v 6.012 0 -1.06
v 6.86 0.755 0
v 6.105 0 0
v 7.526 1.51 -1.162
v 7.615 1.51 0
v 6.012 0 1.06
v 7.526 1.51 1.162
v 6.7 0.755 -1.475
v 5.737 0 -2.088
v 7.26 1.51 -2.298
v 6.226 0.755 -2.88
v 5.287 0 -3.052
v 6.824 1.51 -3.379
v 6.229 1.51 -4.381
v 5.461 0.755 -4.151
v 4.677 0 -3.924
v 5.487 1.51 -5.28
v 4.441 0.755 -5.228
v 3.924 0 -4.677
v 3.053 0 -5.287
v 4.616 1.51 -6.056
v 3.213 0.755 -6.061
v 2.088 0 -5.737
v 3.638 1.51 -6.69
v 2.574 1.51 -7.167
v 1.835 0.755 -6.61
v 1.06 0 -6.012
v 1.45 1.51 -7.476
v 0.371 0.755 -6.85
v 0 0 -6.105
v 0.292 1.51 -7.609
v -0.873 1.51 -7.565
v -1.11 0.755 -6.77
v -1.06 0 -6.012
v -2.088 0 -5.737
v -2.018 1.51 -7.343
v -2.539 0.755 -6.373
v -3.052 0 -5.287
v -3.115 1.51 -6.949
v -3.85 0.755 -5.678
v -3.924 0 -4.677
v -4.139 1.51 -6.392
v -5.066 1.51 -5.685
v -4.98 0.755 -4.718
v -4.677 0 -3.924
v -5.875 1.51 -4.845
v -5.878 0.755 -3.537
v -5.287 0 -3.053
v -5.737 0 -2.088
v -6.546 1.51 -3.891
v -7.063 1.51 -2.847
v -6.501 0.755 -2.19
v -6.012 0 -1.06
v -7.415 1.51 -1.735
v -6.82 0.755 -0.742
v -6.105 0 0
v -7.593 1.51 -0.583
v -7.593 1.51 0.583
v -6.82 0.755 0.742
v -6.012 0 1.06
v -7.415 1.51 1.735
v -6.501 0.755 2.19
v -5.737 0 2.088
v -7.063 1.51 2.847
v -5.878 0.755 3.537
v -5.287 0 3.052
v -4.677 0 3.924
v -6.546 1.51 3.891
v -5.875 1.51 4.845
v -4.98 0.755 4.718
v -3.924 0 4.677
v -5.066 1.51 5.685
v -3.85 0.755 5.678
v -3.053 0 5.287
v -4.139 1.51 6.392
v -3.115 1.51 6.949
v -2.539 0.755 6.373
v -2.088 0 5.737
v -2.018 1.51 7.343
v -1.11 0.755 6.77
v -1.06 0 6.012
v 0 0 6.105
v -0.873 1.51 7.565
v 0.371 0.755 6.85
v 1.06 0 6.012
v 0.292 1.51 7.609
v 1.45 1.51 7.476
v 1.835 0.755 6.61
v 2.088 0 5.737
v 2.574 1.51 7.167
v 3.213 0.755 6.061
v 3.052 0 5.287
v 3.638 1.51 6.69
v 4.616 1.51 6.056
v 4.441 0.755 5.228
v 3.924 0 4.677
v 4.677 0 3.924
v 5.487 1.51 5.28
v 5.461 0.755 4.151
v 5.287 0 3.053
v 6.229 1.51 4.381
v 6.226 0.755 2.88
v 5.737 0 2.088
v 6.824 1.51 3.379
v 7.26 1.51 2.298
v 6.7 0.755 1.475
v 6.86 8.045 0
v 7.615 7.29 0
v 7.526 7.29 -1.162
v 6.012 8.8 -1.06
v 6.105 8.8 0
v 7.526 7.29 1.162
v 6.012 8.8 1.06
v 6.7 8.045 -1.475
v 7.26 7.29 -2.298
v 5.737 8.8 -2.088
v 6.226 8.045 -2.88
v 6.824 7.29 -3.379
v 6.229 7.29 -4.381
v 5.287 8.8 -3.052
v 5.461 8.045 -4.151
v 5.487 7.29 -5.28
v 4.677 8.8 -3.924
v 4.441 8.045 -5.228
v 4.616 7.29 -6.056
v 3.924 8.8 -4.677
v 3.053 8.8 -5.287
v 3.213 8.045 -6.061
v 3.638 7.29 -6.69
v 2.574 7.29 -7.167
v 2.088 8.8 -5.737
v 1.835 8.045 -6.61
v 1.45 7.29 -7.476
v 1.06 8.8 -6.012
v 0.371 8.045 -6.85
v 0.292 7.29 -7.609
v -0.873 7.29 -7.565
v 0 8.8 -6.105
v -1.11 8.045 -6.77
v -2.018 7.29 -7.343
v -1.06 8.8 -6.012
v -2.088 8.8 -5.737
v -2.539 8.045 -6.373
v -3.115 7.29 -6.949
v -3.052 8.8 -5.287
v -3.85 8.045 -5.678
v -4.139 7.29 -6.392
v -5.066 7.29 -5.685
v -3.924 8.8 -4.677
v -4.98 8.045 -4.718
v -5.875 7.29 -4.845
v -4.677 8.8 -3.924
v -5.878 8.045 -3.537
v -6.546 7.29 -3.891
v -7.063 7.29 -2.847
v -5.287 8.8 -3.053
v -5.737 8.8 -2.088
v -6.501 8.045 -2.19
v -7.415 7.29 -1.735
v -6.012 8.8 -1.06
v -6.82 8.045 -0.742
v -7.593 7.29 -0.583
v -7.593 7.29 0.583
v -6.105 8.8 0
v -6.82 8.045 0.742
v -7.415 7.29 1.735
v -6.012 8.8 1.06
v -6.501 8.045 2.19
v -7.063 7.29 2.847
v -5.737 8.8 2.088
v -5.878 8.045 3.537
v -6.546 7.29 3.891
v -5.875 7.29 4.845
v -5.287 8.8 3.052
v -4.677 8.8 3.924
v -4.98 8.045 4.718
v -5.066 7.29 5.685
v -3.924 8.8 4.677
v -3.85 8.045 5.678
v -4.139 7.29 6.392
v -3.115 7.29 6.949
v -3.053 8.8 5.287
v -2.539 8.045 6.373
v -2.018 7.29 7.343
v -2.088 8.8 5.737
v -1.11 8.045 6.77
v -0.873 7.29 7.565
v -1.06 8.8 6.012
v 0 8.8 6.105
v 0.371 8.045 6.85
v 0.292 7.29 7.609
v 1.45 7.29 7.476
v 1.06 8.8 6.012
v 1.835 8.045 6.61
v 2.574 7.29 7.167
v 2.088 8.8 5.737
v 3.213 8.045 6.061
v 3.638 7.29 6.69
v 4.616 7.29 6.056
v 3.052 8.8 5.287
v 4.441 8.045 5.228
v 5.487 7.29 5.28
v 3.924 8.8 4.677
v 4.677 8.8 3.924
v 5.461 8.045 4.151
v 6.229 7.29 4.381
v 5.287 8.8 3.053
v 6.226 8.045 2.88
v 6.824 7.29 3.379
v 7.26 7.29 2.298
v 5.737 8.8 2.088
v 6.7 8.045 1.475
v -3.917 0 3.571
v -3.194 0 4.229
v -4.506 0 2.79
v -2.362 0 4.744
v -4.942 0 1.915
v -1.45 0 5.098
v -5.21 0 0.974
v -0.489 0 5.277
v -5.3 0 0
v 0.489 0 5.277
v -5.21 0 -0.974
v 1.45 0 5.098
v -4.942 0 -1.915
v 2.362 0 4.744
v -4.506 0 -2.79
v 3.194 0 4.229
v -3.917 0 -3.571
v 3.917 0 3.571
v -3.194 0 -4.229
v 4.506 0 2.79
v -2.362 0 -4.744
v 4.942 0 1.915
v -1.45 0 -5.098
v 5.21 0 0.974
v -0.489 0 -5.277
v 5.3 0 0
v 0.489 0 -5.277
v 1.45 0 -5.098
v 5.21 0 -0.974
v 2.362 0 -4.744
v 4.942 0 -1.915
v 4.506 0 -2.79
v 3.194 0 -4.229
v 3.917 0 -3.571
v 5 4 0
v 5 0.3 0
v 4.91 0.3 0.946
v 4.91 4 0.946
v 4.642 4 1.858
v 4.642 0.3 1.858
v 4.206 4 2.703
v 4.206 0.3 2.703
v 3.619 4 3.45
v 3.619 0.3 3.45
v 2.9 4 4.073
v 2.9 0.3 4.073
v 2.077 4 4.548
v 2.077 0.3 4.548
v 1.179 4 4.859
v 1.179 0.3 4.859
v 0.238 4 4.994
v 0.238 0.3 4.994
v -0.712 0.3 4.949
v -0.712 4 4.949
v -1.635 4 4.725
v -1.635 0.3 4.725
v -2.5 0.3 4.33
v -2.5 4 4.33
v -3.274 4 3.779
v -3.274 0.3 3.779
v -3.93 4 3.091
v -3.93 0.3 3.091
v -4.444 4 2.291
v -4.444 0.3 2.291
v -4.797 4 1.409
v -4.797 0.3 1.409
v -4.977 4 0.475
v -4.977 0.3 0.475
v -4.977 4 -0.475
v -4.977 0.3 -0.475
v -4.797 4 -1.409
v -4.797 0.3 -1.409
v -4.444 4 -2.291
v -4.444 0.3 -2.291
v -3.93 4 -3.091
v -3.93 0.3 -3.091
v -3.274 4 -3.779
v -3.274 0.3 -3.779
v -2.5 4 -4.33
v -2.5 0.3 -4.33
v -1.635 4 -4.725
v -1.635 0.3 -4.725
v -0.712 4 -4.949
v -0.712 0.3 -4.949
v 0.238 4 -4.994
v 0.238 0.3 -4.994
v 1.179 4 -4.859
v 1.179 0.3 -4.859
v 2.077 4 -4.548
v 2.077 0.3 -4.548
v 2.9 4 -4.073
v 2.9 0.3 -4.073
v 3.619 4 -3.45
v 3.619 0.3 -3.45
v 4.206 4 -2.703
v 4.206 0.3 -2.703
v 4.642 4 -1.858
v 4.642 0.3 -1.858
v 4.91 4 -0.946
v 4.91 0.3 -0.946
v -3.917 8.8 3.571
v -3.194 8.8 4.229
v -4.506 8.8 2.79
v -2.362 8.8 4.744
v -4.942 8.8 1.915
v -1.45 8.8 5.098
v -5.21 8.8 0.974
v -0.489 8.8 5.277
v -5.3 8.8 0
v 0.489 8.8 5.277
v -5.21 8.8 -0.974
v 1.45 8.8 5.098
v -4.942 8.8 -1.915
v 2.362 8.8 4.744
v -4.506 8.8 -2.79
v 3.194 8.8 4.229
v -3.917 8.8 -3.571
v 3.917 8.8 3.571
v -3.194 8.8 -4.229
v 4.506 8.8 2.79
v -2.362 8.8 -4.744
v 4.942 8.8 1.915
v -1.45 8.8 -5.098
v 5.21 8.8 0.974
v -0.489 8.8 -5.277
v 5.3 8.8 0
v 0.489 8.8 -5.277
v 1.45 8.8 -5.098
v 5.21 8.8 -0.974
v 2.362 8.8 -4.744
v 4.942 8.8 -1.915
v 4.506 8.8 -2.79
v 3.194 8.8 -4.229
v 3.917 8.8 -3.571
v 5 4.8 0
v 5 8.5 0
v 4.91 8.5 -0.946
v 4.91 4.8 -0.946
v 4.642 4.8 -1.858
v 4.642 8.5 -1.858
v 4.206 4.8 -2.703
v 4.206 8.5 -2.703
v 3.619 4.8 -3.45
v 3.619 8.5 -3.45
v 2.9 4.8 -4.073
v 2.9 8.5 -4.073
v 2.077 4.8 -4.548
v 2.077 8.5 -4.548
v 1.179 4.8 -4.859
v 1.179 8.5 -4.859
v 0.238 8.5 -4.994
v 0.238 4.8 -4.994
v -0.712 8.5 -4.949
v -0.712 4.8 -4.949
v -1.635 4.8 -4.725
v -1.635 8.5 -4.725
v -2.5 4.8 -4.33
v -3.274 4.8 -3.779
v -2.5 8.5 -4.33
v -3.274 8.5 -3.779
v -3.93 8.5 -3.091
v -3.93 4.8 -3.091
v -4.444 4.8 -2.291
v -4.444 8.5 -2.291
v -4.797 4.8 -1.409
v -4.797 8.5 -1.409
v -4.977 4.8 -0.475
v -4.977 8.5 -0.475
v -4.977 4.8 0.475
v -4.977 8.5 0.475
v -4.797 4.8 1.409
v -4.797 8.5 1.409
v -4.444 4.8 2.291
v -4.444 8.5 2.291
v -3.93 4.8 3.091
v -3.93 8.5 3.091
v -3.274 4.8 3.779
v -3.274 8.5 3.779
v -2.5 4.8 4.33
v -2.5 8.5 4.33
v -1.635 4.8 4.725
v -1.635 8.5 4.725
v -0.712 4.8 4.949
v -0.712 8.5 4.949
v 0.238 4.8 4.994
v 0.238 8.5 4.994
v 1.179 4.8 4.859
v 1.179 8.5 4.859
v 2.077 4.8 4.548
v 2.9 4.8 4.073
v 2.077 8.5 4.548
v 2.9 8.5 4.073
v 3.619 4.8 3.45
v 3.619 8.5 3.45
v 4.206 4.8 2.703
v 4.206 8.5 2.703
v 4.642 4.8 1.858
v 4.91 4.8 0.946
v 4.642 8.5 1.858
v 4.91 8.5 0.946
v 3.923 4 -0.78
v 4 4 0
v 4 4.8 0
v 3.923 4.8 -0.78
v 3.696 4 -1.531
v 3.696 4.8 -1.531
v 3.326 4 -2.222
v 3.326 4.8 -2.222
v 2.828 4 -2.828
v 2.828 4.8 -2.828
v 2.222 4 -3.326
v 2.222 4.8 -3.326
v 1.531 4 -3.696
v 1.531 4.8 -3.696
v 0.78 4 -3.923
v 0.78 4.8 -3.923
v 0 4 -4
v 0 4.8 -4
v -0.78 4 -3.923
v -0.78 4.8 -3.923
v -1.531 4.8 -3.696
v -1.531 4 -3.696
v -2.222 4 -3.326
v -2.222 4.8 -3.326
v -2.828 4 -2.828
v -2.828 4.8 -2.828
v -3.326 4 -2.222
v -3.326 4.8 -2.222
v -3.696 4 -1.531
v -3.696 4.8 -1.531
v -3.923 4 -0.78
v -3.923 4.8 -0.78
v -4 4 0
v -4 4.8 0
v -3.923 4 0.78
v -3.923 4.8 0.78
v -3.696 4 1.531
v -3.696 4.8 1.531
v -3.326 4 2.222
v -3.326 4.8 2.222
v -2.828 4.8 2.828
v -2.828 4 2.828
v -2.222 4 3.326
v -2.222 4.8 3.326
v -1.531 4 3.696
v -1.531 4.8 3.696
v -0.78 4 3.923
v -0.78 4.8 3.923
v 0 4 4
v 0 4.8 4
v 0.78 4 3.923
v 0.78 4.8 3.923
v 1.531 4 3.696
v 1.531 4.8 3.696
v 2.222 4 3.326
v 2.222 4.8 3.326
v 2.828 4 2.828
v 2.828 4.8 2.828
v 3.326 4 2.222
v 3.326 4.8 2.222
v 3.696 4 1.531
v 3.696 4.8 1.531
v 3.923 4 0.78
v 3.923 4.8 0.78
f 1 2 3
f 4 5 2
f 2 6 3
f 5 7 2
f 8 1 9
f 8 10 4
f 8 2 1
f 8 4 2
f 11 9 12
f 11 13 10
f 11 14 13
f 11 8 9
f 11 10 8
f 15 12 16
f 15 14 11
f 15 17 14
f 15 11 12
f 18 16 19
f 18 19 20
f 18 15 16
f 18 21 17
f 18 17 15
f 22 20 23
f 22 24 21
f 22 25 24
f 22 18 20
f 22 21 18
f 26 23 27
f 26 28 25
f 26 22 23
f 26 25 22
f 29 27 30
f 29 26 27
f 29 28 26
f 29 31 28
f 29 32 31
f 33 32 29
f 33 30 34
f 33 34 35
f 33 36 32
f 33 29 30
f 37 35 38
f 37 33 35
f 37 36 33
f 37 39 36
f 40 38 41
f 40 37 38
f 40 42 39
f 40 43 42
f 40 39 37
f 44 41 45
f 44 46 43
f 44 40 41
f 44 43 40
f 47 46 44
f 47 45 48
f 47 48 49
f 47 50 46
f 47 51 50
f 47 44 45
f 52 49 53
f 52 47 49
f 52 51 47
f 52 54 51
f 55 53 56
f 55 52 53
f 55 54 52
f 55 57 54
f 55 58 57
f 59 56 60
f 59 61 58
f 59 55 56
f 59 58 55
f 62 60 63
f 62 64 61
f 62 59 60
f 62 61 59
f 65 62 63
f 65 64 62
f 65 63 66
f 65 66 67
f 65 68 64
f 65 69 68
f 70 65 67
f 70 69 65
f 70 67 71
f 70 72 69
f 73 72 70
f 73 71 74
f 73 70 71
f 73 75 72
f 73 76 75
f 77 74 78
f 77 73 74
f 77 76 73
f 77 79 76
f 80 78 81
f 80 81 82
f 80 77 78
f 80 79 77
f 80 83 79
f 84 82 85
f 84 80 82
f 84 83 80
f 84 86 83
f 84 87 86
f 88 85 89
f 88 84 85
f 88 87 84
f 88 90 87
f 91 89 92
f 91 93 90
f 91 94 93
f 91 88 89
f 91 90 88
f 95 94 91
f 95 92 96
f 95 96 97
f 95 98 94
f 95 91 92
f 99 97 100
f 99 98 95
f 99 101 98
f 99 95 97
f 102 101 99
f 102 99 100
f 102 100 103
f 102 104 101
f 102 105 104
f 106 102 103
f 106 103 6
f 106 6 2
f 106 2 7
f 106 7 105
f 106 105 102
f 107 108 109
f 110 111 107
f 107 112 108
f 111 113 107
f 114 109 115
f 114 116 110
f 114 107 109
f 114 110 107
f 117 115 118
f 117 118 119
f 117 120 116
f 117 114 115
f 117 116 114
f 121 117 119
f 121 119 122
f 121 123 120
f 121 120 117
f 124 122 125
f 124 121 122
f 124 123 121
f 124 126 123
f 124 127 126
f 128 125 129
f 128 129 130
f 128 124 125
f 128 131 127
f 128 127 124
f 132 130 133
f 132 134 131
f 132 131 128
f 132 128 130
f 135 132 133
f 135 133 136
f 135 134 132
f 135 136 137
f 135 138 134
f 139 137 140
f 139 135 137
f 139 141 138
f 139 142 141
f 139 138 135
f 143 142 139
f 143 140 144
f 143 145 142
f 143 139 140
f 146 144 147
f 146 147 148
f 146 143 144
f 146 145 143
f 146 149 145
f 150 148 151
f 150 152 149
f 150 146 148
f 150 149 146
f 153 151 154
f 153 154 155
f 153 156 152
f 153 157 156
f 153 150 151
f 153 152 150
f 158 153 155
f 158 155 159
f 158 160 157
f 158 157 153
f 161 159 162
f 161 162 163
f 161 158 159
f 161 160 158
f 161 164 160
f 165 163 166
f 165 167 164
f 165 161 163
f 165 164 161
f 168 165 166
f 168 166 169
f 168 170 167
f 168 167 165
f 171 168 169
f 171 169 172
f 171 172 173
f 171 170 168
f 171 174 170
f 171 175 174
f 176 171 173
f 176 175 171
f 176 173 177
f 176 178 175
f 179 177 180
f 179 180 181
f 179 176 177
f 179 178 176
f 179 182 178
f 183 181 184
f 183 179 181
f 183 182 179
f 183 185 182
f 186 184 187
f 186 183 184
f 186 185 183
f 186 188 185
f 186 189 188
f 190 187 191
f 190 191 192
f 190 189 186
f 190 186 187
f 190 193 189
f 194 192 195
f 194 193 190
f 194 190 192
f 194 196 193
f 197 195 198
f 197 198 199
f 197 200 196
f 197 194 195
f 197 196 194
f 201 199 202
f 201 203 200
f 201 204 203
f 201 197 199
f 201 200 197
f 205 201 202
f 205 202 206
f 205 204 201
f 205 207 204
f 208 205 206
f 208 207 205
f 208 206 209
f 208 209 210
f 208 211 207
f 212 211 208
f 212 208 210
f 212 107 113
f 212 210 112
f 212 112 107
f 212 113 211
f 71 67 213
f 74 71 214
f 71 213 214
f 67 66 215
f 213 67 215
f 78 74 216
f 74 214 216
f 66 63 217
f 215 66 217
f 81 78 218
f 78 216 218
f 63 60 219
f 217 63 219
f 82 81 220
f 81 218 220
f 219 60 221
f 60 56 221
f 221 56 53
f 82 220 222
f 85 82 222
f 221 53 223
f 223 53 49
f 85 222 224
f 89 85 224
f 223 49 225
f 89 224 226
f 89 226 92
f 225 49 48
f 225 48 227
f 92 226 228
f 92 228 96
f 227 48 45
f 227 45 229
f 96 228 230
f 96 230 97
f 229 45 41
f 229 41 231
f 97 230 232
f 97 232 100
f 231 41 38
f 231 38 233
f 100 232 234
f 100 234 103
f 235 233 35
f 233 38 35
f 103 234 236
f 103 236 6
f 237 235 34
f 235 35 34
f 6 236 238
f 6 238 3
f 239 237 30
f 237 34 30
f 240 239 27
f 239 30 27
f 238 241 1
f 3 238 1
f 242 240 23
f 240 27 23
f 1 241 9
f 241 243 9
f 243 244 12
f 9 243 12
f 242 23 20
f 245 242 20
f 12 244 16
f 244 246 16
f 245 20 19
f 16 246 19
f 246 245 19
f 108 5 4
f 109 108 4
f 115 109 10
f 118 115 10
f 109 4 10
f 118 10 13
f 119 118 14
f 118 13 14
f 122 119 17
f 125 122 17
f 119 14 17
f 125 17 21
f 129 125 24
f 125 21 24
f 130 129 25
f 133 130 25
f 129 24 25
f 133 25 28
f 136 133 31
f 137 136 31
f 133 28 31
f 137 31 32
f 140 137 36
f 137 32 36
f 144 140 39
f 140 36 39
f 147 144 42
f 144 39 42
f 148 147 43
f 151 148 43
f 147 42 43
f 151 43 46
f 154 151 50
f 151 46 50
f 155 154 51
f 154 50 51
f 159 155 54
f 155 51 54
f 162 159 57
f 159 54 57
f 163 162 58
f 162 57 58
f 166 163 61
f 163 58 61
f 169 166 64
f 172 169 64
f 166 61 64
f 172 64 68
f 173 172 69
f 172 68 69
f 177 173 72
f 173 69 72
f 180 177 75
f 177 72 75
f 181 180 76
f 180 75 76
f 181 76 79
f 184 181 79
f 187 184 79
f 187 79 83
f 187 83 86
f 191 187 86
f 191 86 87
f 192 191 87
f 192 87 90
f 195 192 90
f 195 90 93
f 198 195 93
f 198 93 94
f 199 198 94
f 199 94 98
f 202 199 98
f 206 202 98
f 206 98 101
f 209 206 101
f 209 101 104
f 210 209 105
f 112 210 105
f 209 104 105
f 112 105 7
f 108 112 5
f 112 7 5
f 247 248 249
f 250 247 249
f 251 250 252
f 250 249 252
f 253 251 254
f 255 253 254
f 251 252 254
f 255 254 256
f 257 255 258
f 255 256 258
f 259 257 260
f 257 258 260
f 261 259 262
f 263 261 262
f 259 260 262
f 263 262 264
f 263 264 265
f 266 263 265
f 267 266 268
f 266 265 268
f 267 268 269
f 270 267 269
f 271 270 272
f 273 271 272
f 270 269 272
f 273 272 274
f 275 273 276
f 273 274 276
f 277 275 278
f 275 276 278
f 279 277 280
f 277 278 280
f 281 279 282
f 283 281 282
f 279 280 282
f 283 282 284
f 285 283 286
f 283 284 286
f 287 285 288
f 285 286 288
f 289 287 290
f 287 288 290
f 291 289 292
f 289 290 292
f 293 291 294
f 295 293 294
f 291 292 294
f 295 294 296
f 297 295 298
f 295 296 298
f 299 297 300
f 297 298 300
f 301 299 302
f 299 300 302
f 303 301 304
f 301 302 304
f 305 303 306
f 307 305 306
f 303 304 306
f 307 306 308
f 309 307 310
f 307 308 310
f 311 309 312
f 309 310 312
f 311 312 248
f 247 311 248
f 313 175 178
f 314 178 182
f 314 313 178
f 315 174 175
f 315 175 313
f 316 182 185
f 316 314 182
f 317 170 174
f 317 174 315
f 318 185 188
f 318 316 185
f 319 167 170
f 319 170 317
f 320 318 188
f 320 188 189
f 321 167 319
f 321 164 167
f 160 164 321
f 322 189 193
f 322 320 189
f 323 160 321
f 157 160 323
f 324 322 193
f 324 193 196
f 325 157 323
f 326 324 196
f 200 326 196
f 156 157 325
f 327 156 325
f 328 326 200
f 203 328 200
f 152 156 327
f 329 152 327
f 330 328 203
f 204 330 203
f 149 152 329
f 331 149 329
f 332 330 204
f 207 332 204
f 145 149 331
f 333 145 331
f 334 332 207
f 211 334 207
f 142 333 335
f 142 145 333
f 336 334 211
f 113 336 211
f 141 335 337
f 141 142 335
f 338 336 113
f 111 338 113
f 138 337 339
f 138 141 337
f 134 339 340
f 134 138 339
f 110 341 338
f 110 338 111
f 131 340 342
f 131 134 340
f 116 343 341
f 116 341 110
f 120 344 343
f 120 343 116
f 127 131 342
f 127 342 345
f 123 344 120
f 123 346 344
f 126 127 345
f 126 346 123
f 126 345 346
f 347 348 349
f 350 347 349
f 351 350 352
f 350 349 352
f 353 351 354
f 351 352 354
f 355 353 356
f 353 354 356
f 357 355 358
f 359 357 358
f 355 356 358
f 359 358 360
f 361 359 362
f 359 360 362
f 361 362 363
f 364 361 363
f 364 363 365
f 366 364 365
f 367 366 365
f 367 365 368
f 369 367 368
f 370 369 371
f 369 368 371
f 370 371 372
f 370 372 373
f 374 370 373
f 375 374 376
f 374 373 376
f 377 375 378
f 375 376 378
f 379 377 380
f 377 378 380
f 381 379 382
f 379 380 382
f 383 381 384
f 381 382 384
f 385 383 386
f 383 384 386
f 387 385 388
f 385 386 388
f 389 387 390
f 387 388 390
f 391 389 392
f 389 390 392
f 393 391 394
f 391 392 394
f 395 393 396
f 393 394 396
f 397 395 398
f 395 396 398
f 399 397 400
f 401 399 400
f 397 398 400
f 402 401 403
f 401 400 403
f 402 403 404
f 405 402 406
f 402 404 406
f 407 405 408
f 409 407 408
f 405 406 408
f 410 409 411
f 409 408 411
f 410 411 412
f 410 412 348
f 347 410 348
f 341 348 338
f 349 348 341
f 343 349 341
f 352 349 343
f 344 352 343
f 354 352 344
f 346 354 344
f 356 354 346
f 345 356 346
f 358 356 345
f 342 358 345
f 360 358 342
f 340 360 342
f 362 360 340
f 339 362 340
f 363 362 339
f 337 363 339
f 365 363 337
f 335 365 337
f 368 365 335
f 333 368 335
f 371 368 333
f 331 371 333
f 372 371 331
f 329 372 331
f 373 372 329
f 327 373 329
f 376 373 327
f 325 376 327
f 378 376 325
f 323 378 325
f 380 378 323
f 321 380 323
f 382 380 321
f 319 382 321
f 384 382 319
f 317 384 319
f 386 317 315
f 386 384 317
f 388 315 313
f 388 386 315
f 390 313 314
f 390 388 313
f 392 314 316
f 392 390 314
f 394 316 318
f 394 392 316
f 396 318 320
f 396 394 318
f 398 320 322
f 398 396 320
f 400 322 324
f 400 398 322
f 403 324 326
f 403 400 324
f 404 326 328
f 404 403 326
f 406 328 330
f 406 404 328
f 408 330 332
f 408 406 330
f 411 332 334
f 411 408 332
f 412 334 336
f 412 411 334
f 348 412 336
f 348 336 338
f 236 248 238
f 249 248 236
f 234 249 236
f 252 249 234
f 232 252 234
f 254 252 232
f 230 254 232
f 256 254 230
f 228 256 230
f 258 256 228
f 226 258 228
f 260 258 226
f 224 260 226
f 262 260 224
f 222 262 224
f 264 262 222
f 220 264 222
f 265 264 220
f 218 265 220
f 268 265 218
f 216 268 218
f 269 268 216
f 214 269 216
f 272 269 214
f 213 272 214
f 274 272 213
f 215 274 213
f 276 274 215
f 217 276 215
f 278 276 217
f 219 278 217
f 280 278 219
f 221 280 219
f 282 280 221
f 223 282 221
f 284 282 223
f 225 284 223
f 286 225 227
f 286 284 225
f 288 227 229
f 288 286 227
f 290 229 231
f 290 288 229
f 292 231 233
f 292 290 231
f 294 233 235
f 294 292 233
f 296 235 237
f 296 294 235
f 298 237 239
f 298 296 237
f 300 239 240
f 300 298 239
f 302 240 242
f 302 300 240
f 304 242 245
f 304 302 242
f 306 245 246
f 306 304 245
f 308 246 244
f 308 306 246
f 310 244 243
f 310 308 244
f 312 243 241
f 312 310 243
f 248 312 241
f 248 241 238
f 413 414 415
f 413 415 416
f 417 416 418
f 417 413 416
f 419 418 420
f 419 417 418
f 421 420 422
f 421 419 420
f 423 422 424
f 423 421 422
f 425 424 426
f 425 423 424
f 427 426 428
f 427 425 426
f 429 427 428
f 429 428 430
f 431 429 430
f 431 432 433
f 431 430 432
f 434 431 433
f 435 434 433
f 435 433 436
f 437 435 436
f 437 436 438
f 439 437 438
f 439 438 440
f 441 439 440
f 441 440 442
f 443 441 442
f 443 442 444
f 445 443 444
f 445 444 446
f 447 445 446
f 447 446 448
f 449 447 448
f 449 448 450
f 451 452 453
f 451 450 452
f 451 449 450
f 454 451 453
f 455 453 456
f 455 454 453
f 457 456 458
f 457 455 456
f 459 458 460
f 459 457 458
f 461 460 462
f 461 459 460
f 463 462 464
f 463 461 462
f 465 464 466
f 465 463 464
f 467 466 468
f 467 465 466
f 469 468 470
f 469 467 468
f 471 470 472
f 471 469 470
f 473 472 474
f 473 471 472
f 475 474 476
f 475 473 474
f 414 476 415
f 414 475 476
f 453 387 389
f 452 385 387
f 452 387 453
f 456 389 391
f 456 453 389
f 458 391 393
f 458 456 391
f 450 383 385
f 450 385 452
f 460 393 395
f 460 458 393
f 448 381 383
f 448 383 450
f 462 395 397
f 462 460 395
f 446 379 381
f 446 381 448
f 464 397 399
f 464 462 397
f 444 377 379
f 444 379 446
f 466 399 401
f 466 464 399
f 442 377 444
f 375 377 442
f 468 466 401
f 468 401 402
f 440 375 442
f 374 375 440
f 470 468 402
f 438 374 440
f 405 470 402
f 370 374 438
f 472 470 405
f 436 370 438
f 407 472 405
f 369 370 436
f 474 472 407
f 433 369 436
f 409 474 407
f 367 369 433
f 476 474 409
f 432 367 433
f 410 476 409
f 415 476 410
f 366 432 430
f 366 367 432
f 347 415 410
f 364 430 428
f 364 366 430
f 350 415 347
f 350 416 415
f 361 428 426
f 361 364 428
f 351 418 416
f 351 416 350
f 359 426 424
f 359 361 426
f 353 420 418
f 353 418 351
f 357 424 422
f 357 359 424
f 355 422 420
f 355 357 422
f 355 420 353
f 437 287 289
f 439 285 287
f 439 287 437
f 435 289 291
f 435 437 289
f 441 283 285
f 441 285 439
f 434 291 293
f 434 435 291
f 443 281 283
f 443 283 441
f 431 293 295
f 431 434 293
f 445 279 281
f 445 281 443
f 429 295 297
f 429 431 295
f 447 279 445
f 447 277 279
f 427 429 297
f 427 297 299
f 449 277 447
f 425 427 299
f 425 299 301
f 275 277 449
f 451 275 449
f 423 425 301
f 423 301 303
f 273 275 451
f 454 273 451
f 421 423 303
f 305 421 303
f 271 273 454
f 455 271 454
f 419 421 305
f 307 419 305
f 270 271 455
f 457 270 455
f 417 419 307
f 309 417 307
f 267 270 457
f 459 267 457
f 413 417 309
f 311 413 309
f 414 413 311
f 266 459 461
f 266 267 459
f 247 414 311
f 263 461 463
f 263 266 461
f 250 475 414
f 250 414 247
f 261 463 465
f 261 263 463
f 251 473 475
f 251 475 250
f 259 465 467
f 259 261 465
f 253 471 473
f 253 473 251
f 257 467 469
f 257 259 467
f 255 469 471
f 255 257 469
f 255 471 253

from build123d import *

# Parameters (mm, degrees)
SKETCH1_R           = 7.615
SKETCH1_R_2         = 4
BOSS_EXTRUDE1_DEPTH = 8.8
SKETCH2_R           = 5
CUT_EXTRUDE1_DEPTH  = 4
SKETCH3_R           = 5
CUT_EXTRUDE2_DEPTH  = 4
CHAMFER1_SIZE       = 0.3
CHAMFER2_SIZE       = 1.51


with BuildPart() as part:
    # Sketch1 → Boss-Extrude1 (new body)
    with BuildSketch(Plane(origin=(0, 0, 0), x_dir=(1, 0, 0), z_dir=(0, 1, 0))):
        Circle(SKETCH1_R)
        Circle(SKETCH1_R_2, mode=Mode.SUBTRACT)
    extrude(amount=BOSS_EXTRUDE1_DEPTH)

    # Sketch2 → Cut-Extrude1 (cut)
    with BuildSketch(Plane(origin=(0, 8.8, 0), x_dir=(1, 0, 0), z_dir=(0, 1, 0))):
        Circle(SKETCH2_R)
    extrude(amount=-CUT_EXTRUDE1_DEPTH, mode=Mode.SUBTRACT)

    # Sketch3 → Cut-Extrude2 (cut)
    with BuildSketch(Plane.XZ):
        Circle(SKETCH3_R)
    extrude(amount=-CUT_EXTRUDE2_DEPTH, mode=Mode.SUBTRACT)

    # Chamfer1
    chamfer1_edges = [part.edges().sort_by_distance(p)[0] for p in [
        (-5, 8.8, 0),
        (-5, 0, 0),
    ]]
    chamfer(chamfer1_edges, length=CHAMFER1_SIZE)

    # Chamfer2
    chamfer2_edges = [part.edges().sort_by_distance(p)[0] for p in [
        (-7.615, 0, 0),
        (-7.615, 8.8, 0),
    ]]
    chamfer(chamfer2_edges, length=CHAMFER2_SIZE)


solid = part.part
